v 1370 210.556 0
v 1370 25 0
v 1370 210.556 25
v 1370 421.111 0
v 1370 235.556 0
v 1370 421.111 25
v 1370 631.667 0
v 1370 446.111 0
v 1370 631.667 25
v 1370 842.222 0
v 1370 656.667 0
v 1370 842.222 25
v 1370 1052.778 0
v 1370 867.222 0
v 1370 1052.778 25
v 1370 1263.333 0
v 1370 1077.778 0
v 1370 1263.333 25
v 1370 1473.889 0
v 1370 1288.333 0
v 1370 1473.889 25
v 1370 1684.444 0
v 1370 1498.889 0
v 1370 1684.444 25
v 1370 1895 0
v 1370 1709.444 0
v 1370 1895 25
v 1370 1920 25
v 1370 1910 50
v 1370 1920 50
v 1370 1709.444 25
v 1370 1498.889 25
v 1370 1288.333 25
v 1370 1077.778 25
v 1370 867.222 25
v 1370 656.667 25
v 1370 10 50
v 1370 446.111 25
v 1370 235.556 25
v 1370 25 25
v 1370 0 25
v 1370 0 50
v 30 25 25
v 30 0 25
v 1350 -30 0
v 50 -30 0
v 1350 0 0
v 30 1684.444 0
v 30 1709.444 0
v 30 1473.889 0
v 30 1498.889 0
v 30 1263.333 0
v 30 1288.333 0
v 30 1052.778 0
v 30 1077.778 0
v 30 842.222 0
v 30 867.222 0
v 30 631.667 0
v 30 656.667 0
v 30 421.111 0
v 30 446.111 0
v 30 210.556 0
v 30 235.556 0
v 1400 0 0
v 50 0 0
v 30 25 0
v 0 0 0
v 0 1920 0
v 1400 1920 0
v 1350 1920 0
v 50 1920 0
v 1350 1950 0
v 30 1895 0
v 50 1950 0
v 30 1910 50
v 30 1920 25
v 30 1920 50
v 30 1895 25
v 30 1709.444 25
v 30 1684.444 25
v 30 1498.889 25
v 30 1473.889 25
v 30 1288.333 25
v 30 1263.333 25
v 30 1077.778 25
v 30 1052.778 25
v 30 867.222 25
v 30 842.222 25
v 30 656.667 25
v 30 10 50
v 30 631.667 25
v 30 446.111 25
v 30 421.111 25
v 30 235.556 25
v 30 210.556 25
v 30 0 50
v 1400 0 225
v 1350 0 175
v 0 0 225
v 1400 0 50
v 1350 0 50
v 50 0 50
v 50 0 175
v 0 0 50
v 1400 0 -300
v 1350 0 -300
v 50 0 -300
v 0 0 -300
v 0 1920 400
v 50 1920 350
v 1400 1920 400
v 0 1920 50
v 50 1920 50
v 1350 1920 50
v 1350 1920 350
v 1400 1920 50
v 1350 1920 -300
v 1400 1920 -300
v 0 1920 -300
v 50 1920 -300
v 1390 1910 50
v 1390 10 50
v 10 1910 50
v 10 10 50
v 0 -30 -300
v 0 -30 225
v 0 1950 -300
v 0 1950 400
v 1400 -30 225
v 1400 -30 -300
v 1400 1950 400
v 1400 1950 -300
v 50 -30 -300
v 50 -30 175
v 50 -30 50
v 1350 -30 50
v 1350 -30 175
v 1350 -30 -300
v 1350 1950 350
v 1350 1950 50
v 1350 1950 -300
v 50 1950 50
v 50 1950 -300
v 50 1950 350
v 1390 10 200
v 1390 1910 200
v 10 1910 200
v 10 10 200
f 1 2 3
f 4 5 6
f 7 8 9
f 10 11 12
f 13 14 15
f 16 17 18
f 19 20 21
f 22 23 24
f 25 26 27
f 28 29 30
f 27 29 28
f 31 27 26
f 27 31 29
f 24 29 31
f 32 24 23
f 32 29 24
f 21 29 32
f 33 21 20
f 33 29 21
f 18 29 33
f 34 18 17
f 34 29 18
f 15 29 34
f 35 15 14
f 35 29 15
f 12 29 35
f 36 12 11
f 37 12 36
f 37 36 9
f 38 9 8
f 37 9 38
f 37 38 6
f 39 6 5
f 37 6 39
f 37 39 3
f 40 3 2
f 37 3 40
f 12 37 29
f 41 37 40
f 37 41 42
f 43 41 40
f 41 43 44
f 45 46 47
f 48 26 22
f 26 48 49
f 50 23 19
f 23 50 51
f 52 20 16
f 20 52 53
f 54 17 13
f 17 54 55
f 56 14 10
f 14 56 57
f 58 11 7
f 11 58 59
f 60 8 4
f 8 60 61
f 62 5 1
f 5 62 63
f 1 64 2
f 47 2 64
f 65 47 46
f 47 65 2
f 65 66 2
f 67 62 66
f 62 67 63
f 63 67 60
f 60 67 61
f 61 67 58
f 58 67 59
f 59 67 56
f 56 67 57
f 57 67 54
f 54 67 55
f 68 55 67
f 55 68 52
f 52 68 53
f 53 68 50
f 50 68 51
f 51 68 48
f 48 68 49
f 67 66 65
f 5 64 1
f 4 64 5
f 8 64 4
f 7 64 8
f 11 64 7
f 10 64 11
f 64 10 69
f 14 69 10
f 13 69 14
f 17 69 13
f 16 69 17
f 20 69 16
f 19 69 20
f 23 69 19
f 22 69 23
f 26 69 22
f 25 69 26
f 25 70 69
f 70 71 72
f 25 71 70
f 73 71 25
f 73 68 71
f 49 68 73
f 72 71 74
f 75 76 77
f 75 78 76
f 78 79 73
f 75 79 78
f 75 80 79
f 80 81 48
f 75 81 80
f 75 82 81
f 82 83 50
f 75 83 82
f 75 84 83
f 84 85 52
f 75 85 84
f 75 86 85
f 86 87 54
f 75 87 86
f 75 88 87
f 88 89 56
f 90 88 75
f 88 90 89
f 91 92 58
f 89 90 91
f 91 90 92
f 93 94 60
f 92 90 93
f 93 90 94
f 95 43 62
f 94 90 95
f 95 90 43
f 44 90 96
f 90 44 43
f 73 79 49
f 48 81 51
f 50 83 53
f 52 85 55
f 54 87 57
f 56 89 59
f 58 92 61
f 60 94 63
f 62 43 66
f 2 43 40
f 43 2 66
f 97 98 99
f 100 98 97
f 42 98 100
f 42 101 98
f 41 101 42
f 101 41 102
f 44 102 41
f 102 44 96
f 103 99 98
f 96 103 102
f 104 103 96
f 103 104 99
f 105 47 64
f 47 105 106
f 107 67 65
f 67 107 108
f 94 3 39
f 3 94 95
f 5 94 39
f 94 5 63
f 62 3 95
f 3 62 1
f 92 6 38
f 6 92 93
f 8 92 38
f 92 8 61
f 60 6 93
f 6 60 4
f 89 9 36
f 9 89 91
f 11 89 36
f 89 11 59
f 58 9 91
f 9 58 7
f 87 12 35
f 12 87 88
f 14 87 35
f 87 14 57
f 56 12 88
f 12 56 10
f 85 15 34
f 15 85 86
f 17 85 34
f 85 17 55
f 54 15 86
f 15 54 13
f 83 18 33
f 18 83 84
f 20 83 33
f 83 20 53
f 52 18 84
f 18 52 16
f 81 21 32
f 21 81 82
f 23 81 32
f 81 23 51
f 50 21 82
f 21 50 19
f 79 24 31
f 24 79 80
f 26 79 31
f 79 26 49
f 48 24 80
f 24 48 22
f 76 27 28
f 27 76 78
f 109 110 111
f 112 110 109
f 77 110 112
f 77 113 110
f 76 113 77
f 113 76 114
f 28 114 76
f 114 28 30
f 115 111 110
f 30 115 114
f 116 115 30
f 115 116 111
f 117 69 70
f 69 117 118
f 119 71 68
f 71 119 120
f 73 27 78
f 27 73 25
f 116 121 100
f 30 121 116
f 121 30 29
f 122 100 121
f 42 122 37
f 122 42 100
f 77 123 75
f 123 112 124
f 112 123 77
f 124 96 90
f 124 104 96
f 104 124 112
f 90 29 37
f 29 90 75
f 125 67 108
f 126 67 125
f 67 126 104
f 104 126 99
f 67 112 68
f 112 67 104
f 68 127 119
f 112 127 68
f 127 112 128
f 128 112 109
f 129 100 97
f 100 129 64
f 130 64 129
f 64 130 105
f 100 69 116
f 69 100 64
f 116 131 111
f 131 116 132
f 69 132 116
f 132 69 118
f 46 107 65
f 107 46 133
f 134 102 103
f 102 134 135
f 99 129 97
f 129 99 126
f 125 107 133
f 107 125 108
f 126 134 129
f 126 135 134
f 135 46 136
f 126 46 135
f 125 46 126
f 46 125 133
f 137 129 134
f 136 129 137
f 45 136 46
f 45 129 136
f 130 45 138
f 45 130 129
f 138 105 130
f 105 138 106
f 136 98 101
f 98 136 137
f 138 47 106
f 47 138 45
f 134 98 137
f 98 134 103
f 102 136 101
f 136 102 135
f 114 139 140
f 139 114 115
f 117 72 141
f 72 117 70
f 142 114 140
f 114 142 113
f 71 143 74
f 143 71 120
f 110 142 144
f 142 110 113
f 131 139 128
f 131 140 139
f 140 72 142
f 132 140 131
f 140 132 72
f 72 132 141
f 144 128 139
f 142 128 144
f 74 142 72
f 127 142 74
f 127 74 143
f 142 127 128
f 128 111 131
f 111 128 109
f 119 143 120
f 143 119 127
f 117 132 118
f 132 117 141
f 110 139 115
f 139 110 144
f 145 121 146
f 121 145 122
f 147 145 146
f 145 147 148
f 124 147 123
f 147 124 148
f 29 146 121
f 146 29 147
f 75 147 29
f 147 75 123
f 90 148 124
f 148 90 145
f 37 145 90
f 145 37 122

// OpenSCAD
main_h = 30;
main_w = 50;

travessa_h = 25;
travessa_w = 25;

mattress_w = 1380;
mattress_l = 1900;
mattress_h = 150;

foot_h = 300;
footer_h = foot_h + travessa_w + mattress_h + main_w;
header_h = 700;

folga = 20;

estrado_h = 15;

WHITE = [ 1.0, 1.0, 1.0 ];
BLACK = [ 0.0, 0.0, 0.0 ];

N = 10;

del = ( mattress_l + folga - N * travessa_h ) / ( N - 1 );
echo( del );
echo( N * ( mattress_w + folga ) );

    // Laterais:
    
    translate( [ 0, 0, 0 ] )
        color( BLACK ) cube( [ main_h, mattress_l + folga, main_w ] );
    
    translate( [ mattress_w + folga - main_h, 0, 0 ] )
        color( BLACK ) cube( [ main_h, mattress_l + folga, main_w ] );
    
    // "pezeira":
    translate( [ 0, -main_h, -foot_h ] )
        color( BLACK ) cube( [ main_w, main_h, footer_h ] );
    translate( [ mattress_w + folga - main_w, -main_h, -foot_h ] )
        color( BLACK ) cube( [ main_w, main_h, footer_h ] );
    translate( [ 0, -main_h, footer_h - foot_h - main_w ] )
        color( BLACK ) cube( [ mattress_w + folga, main_h, main_w ] );

    
    // Transversais:
    translate( [ main_w, -main_h, 0 ] )
        color( BLACK ) cube( [ mattress_w + folga - 2 * main_w, main_h, main_w ] );
    translate( [ main_w, mattress_l + folga, 0 ] )
        color( BLACK ) cube( [ mattress_w + folga - 2 * main_w, main_h, main_w ] );
        
    // Cabeceira:
    translate( [ 0, mattress_l + folga, -foot_h ] )
        color( BLACK ) cube( [ main_w, main_h, header_h ] );
    translate( [ mattress_w + folga - main_w, mattress_l + folga, -foot_h ] )
        color( BLACK ) cube( [ main_w, main_h, header_h ] );
    translate( [ 0, mattress_l + folga, header_h - foot_h - main_w ] )
        color( BLACK ) cube( [ mattress_w + folga, main_h, main_w ] );

    
    echo( 2 * ( mattress_l + folga ) + 2 * footer_h + 2 * header_h + 2 * ( mattress_w + folga - 2 * ( main_w - main_h ) ) );
    
    // Colchão:
    color( WHITE )
        translate( [ folga / 2, folga / 2, main_w ] )
            #cube( [ mattress_w, mattress_l, mattress_h ] );
            
    // Estrado:
    for ( i = [ 0 : N - 1 ] ) {
            translate( [ main_h, i * ( del + travessa_h ), 0 ] )
                color( BLACK ) cube( [ mattress_w + folga - 2 * main_h, travessa_h, travessa_w ] );
    }
    
    echo( mattress_w + folga );
    echo( footer_h );
    echo( mattress_w + folga - 2 * main_w );
